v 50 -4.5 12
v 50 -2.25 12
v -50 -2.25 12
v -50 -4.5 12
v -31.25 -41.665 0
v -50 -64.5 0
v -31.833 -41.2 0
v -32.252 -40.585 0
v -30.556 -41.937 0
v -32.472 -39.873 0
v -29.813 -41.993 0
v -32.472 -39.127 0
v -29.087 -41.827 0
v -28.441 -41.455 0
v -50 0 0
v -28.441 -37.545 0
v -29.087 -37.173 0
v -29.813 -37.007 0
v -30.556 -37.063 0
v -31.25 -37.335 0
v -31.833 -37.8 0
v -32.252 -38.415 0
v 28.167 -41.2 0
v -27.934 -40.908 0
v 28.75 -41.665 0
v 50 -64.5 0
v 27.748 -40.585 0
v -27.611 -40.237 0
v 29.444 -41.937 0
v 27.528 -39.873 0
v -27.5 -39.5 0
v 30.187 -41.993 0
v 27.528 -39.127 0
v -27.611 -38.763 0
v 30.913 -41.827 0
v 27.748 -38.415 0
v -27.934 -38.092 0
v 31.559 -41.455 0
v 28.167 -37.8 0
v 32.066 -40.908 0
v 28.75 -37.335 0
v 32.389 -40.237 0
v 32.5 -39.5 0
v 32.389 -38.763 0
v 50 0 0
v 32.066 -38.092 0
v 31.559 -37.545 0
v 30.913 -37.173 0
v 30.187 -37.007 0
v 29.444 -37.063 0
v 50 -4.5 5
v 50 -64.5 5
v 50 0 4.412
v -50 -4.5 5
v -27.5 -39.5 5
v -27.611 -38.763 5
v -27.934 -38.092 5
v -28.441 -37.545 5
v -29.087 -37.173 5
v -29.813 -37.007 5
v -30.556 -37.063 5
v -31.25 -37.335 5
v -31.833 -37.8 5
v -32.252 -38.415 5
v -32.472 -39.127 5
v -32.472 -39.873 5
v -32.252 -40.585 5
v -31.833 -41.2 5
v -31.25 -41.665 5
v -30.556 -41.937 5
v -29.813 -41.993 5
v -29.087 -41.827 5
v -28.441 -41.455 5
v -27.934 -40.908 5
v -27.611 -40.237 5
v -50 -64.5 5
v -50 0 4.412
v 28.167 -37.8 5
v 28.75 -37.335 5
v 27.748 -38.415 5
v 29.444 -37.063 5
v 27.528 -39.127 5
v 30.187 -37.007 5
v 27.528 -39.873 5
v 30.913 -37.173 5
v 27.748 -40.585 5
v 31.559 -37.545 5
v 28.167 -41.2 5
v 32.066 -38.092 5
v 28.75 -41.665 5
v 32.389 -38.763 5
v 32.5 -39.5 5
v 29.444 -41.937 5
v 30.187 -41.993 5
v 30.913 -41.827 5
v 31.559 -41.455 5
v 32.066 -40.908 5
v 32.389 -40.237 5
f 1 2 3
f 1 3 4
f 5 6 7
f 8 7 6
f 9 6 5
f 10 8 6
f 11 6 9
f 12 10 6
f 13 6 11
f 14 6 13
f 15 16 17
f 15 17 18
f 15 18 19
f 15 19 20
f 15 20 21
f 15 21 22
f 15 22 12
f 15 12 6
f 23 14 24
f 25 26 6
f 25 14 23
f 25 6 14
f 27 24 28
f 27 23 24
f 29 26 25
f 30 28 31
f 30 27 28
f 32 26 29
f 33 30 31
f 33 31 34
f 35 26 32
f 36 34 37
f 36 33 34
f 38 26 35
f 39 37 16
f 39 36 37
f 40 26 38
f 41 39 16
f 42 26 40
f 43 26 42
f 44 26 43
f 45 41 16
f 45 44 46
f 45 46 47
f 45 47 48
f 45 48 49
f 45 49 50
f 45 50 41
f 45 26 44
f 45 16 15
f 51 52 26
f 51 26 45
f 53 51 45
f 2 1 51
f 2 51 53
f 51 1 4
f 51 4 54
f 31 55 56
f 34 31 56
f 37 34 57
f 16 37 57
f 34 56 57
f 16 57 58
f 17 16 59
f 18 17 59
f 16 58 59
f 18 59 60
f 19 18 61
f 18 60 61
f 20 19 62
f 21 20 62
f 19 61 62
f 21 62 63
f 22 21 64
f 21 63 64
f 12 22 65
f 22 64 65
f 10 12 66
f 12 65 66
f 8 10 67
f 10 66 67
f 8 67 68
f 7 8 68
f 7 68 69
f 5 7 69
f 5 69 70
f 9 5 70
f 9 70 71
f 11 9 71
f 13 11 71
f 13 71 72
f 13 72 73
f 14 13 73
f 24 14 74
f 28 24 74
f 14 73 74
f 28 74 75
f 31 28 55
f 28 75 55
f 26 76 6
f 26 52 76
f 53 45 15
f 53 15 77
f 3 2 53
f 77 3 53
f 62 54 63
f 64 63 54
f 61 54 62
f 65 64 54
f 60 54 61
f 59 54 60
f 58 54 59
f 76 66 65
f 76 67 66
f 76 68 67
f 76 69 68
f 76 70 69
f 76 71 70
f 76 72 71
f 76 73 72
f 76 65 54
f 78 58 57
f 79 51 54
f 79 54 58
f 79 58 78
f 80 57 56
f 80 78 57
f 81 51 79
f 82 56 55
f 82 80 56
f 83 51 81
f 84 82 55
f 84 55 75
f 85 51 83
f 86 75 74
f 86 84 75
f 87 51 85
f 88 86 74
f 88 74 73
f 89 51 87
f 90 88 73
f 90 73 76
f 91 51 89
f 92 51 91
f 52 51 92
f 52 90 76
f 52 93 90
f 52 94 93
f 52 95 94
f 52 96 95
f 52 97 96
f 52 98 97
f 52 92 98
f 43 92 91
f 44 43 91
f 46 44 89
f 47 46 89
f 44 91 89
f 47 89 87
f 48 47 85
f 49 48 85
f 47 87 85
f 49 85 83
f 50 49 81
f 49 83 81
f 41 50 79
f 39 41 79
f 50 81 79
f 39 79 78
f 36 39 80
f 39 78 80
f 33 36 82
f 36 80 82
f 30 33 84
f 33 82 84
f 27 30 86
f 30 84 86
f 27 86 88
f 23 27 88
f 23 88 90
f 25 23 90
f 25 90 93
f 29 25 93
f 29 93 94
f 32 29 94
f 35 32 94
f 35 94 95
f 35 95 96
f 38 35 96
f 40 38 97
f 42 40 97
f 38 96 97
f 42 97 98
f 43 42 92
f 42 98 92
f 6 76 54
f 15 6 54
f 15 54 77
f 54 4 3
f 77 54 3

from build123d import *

# Parameters (mm, degrees)
F1_DEPTH = 50
F3_DEPTH = 100
F4_R     = 2.5
F5_DEPTH = 5


with BuildPart() as f1:
    # F0 (on Right) → F1 (new body, symmetric)
    with BuildSketch(Plane.YZ):
        Polygon((-64.5, 0), (0, 0), (0, 12), (-4.5, 12), (-4.5, 5), (-64.5, 5), align=None)
    extrude(amount=F1_DEPTH, both=True)

    # F2 (on face) → F3 (cut, through all)
    with BuildSketch(Plane.YZ.offset(50)):
        Polygon((0, 12), (-2.25, 12), (0, 4.411913), align=None)
    extrude(amount=-F3_DEPTH, mode=Mode.SUBTRACT)

    # F4 (on face) → F5 (cut, through all)
    with BuildSketch(Plane.XY.offset(5)):
        with Locations((-30, -39.5)):
            Circle(F4_R)
        with Locations((30, -39.5)):
            Circle(F4_R)
    extrude(amount=-F5_DEPTH, mode=Mode.SUBTRACT)


solid = f1.part
